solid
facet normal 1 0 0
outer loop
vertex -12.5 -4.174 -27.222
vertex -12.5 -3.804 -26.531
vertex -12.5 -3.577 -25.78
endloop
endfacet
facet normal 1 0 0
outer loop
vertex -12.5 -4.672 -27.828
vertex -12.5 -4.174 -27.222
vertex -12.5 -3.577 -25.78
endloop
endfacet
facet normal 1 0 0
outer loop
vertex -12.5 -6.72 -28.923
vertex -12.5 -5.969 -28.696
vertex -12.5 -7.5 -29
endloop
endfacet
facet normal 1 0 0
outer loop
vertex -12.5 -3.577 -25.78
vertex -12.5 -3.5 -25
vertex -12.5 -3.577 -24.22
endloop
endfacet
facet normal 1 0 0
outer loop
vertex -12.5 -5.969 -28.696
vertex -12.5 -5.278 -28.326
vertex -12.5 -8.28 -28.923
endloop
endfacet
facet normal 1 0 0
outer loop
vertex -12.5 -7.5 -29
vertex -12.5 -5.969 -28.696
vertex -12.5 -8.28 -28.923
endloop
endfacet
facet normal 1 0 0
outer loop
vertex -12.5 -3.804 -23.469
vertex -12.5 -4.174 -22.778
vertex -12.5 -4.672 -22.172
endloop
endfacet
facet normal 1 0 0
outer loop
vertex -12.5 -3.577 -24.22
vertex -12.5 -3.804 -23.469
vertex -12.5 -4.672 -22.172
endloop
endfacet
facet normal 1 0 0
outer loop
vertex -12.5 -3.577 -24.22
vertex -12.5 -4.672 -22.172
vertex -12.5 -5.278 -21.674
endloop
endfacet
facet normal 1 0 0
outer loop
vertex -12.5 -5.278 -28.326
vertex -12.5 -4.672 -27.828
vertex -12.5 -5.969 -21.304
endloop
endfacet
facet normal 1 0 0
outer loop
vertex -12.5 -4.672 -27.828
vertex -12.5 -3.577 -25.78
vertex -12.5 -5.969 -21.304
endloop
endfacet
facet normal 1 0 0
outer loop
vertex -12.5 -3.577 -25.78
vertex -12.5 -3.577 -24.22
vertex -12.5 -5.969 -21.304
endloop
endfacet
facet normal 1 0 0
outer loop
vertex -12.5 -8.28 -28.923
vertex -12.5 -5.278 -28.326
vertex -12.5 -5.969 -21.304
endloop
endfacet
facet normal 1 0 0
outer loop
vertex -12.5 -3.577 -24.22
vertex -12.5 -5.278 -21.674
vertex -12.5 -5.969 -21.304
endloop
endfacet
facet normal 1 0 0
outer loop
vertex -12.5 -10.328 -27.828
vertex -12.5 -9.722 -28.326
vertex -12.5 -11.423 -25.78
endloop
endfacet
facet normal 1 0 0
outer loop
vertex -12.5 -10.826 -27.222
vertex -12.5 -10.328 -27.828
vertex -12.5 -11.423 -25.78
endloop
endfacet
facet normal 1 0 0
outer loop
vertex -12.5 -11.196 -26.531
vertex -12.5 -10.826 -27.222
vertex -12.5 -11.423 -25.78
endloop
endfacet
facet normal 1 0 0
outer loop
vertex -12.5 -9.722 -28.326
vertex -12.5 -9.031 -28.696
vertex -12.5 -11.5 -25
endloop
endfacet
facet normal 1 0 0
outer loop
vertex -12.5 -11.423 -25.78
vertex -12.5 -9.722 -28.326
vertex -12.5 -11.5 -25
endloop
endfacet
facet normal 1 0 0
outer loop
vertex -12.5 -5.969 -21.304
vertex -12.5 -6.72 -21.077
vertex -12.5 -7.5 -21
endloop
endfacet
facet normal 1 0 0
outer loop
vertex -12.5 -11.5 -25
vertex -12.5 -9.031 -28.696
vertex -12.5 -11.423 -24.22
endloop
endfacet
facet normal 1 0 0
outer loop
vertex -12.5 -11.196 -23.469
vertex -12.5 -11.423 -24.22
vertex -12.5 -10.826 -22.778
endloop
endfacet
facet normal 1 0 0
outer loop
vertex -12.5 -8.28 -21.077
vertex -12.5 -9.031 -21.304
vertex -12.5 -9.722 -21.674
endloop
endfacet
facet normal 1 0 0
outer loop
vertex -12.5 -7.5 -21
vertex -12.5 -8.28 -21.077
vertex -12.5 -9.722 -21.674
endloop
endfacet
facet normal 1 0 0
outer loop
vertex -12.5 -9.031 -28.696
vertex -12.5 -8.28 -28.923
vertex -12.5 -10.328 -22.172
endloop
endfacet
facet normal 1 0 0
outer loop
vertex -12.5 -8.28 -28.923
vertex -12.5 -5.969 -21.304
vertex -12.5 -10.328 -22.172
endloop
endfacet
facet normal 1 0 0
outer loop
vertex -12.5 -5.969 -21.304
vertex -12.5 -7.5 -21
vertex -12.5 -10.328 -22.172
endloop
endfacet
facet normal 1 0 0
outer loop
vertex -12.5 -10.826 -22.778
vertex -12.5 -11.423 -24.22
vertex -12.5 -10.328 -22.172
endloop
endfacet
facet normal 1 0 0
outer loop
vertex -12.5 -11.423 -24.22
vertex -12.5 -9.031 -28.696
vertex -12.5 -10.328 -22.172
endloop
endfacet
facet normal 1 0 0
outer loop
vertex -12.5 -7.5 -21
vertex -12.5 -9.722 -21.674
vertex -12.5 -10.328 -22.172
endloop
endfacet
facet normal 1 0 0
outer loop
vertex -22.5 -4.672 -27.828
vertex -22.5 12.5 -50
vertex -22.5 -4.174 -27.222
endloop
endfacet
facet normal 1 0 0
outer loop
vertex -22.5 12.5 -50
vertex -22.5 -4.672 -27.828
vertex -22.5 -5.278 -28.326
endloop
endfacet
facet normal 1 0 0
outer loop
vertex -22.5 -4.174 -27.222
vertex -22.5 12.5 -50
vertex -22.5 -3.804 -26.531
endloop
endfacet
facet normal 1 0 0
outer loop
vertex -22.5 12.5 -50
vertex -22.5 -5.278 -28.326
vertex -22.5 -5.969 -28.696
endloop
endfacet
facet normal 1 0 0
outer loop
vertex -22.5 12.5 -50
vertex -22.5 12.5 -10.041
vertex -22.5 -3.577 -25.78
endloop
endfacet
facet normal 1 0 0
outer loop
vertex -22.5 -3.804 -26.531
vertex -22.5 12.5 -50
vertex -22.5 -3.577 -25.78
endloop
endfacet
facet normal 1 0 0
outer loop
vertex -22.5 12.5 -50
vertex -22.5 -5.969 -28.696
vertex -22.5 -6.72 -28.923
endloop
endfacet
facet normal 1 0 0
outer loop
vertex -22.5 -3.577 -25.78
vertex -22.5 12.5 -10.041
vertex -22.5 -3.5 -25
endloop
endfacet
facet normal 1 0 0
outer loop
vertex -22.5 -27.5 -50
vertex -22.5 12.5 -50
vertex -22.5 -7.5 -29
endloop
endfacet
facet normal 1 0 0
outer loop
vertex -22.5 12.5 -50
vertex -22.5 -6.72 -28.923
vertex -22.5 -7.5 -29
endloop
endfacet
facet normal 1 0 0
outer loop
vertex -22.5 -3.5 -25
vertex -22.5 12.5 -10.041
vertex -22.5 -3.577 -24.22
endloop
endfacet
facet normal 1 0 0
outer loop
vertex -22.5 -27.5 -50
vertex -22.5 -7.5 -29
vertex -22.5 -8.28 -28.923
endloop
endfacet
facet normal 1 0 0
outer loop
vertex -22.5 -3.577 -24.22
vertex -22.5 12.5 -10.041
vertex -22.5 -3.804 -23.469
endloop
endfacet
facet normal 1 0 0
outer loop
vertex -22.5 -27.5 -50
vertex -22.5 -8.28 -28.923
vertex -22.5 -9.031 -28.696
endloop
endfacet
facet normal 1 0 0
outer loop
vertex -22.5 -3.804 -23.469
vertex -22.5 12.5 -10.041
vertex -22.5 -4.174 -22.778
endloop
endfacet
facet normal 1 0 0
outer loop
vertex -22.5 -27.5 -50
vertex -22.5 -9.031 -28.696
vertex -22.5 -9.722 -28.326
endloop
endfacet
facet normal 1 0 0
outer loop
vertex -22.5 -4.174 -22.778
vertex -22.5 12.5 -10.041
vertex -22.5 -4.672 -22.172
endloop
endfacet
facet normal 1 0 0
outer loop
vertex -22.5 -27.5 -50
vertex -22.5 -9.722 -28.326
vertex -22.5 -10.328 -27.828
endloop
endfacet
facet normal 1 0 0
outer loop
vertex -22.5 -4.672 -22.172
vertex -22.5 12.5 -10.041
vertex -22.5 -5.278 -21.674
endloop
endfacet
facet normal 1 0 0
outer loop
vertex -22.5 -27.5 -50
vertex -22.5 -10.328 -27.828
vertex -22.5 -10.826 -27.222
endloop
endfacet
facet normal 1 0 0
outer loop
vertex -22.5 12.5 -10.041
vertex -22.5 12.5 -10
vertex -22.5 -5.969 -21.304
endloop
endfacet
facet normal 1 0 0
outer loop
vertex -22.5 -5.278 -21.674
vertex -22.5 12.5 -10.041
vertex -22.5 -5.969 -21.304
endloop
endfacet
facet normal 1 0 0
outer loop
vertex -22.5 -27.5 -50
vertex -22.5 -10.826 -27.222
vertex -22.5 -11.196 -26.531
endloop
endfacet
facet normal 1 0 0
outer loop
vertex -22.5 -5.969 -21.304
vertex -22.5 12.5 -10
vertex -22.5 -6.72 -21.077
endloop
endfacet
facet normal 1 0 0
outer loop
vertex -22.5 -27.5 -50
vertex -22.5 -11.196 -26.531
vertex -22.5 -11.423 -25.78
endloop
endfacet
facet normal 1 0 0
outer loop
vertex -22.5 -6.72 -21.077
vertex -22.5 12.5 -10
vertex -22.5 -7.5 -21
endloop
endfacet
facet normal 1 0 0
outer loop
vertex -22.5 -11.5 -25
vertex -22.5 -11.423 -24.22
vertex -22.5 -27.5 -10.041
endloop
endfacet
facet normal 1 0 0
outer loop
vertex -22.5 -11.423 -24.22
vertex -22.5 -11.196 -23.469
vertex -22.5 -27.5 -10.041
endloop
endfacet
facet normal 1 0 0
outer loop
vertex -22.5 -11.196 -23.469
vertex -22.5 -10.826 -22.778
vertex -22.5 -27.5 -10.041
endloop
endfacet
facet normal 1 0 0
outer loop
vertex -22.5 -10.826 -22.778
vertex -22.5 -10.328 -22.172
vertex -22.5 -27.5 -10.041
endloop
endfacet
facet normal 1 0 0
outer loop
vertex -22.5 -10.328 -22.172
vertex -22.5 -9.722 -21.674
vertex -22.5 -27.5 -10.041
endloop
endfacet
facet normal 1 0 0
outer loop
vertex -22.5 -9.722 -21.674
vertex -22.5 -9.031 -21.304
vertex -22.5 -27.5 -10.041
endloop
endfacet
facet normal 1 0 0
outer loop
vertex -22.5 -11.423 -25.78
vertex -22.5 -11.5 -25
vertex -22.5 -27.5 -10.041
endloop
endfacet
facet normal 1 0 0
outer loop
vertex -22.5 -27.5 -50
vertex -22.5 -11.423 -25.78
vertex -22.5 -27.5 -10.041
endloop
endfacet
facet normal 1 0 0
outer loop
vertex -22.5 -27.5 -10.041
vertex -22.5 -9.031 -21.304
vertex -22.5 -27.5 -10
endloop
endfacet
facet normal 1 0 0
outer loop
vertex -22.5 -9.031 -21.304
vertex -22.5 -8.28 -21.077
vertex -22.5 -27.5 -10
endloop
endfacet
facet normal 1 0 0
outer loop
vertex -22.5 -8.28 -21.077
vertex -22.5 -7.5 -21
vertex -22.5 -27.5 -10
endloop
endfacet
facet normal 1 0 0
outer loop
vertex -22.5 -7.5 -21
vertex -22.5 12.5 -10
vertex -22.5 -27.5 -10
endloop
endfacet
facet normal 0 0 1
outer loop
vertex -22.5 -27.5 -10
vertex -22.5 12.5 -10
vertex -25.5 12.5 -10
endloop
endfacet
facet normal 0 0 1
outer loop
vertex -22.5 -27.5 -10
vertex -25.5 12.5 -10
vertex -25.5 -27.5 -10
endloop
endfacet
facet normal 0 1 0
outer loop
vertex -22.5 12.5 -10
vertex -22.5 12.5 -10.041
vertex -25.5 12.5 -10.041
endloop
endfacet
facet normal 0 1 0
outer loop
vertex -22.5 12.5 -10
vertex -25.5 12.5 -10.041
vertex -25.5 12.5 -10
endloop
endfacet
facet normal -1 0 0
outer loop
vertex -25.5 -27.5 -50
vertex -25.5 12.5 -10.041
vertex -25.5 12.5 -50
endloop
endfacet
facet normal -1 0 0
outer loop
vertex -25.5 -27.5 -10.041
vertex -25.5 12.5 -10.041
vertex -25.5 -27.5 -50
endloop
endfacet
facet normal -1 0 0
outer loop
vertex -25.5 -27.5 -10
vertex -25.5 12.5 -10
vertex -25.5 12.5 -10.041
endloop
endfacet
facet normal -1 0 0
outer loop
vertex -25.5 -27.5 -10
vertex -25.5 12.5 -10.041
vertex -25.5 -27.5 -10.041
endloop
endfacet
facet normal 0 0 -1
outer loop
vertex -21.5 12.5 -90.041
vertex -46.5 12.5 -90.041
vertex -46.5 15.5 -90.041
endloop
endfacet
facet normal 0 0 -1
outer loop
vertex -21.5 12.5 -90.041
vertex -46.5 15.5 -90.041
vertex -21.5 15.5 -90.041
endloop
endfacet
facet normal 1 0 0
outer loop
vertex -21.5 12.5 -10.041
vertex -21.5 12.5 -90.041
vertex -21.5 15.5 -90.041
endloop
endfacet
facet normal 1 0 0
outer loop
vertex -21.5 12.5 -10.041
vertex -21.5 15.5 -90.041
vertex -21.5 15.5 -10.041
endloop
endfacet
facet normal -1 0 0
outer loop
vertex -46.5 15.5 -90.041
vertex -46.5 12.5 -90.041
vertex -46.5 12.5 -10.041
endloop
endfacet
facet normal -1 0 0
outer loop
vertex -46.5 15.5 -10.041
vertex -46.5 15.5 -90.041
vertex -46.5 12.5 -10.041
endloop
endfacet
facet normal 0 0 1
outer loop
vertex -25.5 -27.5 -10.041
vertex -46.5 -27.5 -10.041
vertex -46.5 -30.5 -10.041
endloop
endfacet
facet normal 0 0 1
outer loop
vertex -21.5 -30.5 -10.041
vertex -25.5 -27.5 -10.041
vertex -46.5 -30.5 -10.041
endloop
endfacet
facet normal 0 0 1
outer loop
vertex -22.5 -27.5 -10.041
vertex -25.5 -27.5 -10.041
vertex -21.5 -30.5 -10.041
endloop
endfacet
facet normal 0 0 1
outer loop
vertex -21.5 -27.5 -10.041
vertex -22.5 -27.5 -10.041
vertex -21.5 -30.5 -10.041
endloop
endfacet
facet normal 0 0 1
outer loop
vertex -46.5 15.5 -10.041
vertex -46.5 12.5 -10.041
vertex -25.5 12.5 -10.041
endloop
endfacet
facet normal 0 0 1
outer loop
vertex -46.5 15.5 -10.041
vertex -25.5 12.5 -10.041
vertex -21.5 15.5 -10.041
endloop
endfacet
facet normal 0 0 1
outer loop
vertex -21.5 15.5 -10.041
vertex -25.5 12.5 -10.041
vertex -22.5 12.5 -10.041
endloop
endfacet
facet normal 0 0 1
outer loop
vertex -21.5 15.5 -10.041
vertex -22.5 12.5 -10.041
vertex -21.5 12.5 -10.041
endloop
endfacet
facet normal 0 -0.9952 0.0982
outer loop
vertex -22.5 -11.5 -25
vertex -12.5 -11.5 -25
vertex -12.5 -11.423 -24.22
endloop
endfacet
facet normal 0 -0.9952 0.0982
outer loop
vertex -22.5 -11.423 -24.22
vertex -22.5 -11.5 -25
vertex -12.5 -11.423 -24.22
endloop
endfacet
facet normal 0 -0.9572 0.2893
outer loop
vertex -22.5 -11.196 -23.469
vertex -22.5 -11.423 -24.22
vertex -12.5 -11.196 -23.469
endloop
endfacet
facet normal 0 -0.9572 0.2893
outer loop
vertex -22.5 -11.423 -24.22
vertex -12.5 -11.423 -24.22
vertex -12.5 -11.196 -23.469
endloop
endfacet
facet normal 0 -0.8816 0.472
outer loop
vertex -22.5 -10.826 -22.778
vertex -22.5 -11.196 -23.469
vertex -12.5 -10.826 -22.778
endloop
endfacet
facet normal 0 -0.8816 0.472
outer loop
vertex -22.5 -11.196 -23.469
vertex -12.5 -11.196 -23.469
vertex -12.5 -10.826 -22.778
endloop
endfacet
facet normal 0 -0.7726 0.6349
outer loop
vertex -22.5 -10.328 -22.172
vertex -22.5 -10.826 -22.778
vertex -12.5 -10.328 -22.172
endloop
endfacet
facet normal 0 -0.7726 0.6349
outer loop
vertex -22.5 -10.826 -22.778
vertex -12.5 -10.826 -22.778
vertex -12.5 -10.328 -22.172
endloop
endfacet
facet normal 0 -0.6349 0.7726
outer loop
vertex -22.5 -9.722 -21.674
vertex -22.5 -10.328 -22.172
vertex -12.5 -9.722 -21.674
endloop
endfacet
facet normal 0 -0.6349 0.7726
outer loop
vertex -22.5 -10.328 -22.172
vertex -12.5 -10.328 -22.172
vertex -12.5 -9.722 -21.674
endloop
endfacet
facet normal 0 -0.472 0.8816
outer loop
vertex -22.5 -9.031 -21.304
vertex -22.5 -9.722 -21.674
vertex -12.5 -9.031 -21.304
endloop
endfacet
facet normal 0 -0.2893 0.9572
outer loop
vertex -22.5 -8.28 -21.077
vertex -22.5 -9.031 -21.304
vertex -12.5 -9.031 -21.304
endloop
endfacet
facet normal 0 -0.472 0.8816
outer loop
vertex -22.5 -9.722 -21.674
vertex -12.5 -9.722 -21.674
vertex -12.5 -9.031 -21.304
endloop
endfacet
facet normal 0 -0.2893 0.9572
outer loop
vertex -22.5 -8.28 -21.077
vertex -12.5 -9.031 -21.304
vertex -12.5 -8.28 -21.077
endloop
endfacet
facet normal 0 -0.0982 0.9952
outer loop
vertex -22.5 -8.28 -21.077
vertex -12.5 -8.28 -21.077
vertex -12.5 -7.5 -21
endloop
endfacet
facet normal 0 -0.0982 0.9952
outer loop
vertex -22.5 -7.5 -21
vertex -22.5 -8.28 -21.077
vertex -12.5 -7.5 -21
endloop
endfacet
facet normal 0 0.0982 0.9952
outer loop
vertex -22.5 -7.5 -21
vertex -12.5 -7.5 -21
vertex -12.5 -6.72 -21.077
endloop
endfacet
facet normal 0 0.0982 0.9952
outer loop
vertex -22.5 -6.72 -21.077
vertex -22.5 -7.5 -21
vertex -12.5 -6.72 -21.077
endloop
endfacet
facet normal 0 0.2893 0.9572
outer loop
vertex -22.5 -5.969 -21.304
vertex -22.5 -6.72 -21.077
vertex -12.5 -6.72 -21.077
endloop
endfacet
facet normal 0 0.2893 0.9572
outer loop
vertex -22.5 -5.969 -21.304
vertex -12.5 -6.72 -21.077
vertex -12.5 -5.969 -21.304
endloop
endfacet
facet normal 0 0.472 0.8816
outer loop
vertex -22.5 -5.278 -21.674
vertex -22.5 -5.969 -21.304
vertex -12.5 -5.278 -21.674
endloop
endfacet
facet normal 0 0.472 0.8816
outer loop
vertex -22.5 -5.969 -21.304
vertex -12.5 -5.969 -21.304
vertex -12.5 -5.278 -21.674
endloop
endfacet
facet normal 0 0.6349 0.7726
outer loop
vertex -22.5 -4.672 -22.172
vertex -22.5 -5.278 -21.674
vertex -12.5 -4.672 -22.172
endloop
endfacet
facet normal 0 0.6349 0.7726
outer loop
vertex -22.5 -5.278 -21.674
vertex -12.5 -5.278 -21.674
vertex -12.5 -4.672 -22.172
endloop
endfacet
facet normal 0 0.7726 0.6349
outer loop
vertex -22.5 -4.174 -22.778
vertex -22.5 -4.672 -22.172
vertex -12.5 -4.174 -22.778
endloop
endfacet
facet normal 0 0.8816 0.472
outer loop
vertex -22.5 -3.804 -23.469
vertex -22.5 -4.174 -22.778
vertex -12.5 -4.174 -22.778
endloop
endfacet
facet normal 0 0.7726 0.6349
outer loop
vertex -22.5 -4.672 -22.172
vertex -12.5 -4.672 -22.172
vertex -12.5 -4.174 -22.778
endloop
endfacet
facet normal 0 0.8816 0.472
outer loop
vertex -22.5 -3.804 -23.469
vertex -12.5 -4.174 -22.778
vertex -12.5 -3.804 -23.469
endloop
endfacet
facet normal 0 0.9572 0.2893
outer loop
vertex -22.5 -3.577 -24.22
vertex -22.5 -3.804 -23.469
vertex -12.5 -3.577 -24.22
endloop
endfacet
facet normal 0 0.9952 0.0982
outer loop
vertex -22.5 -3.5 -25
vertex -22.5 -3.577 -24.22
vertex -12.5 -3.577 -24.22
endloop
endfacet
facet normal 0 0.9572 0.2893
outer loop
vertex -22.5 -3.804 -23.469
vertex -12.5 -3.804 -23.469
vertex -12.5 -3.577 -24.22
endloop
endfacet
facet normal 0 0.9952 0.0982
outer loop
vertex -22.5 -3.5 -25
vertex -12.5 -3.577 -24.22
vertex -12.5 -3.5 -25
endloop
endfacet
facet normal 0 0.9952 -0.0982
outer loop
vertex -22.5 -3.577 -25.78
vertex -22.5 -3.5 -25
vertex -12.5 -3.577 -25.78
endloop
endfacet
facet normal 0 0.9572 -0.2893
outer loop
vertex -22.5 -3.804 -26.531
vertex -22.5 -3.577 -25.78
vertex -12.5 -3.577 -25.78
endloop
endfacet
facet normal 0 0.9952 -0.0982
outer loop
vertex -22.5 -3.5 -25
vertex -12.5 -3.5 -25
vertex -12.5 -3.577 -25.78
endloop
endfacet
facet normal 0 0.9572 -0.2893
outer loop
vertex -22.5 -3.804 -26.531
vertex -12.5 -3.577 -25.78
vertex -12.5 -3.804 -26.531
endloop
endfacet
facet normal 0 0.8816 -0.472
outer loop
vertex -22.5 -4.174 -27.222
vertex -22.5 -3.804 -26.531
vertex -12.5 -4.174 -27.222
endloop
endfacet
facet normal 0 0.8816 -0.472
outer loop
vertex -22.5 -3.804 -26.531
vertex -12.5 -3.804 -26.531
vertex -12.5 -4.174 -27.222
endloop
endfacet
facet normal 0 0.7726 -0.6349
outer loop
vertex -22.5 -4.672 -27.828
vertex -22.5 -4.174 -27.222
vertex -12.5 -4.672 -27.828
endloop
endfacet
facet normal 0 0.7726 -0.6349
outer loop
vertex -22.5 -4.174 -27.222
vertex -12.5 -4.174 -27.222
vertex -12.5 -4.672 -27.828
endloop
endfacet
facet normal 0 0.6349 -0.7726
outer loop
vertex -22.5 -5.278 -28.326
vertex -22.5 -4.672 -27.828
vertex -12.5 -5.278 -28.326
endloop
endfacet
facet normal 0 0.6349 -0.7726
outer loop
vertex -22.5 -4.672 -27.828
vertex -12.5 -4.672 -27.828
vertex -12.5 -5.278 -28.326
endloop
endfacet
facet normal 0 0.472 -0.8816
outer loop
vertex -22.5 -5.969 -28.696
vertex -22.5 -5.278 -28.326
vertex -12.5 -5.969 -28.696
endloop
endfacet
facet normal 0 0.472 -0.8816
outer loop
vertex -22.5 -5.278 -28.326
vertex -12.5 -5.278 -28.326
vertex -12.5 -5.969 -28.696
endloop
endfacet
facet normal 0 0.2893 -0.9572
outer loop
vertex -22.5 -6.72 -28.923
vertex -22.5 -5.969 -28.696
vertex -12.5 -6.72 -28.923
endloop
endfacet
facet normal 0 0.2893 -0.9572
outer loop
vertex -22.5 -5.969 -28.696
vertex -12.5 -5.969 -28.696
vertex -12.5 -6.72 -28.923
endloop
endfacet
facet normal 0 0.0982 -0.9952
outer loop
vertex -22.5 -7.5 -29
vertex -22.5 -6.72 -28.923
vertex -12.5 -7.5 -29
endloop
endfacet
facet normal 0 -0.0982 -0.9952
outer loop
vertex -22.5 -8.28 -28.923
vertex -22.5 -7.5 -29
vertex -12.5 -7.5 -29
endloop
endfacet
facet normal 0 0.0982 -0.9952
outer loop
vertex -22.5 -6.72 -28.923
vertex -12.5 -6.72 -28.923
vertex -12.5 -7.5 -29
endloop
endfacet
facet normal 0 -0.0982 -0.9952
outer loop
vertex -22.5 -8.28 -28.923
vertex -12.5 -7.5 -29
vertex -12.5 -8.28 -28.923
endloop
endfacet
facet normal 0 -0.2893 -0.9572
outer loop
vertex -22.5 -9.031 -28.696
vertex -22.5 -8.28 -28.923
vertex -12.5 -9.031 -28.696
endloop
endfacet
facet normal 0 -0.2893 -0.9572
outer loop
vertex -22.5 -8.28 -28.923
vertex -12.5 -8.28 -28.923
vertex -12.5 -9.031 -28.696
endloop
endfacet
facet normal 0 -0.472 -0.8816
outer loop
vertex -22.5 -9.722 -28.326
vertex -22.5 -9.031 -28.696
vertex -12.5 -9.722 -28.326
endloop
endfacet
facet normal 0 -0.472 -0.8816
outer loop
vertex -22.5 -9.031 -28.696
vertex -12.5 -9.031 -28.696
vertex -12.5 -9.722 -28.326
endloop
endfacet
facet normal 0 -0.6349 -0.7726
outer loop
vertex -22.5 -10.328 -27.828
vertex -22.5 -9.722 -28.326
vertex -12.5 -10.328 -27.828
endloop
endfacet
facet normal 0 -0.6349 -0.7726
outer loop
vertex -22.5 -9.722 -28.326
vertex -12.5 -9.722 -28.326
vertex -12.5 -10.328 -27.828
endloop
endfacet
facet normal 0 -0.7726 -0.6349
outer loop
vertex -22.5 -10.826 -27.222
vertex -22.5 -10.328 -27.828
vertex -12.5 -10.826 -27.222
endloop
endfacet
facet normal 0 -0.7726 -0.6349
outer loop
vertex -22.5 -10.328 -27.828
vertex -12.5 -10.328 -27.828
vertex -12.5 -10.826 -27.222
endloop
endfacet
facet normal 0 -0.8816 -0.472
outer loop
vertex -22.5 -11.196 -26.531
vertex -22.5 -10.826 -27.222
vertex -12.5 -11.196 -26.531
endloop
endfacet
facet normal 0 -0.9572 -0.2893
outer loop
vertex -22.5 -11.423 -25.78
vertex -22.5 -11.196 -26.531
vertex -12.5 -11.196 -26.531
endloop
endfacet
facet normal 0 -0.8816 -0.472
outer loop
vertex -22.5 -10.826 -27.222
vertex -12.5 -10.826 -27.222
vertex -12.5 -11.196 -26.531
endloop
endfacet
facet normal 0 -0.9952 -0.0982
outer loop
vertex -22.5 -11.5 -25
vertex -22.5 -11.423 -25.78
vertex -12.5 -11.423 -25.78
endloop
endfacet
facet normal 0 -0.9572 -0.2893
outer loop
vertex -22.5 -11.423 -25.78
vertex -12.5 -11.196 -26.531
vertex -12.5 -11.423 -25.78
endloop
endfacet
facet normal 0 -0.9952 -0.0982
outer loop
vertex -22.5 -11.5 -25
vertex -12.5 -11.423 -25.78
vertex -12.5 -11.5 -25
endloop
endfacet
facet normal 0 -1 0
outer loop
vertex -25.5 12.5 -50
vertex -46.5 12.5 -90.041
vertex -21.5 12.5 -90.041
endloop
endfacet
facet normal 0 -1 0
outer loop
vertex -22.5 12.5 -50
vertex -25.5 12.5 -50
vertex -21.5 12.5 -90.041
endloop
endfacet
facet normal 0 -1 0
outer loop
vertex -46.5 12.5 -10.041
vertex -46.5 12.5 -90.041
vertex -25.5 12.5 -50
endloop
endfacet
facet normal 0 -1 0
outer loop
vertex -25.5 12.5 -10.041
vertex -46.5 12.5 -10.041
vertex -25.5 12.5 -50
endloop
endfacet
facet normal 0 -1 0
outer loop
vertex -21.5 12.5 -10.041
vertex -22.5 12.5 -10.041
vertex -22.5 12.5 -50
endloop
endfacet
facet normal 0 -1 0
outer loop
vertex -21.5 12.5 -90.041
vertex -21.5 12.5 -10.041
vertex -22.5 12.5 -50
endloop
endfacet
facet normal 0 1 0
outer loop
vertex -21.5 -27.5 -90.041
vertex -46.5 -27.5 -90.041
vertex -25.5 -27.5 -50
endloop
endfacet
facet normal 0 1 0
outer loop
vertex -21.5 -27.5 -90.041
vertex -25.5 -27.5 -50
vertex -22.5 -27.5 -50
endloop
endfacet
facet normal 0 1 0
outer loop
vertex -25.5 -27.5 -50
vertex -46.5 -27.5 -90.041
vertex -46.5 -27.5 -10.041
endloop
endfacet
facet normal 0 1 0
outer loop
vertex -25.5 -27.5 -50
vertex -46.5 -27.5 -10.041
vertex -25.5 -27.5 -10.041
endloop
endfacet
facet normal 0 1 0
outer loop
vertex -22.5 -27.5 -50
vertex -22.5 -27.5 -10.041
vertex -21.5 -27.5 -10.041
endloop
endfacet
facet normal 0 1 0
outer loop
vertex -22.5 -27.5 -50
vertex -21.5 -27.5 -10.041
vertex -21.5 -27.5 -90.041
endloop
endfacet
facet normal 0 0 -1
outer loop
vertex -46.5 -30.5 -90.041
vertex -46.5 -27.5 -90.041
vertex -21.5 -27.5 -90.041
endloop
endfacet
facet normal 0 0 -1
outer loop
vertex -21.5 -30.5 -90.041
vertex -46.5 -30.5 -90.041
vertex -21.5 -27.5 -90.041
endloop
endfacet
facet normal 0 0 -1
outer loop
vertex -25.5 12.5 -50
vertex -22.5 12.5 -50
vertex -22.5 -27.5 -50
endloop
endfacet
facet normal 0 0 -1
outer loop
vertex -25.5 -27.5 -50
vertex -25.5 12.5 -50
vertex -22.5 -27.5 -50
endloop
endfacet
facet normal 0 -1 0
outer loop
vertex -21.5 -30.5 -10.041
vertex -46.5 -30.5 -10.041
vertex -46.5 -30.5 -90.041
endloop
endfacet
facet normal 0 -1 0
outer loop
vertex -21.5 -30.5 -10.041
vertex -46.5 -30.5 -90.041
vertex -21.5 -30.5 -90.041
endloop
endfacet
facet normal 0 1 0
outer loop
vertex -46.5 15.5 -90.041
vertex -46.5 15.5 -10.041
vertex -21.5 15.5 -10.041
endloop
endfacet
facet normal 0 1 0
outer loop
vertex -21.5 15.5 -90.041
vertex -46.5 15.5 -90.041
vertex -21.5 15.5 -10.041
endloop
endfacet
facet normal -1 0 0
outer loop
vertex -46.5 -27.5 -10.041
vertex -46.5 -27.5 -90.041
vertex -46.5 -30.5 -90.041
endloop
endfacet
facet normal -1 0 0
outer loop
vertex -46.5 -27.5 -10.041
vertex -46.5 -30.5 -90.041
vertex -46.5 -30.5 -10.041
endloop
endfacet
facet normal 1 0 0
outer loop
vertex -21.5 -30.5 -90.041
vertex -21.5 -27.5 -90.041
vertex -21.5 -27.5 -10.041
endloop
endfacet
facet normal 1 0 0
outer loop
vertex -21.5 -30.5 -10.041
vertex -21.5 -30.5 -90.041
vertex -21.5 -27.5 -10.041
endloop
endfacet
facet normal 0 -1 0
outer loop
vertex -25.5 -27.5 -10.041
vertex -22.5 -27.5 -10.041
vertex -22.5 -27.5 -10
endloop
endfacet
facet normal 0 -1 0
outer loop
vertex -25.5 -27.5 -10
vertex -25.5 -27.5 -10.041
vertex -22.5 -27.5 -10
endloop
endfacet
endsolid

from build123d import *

# Parameters (mm, degrees)
SKETCH005_W  = 25
SKETCH005_H  = 80
PAD004_DEPTH = 3
SKETCH003_R  = 4
PAD002_DEPTH = 10
SKETCH004_W  = 40
SKETCH004_H  = 40
PAD003_DEPTH = 3
SKETCH006_W  = 25
SKETCH006_H  = 80
PAD005_DEPTH = 3


with BuildPart() as pad004:
    # Sketch005 → Pad004 (new body)
    with BuildSketch(Plane.XZ.offset(-12.5)):
        with Locations((-34, -50.041499)):
            Rectangle(SKETCH005_W, SKETCH005_H)
    extrude(amount=-PAD004_DEPTH)


with BuildPart() as pad002:
    # Sketch003 → Pad002 (new body)
    with BuildSketch(Plane(origin=(-12.5, 0, 0), x_dir=(0, -1, 0), z_dir=(-1, 0, 0))):
        with Locations((7.5, -25)):
            Circle(SKETCH003_R)
    extrude(amount=PAD002_DEPTH)


with BuildPart() as pad003:
    # Sketch004 → Pad003 (new body)
    with BuildSketch(Plane(origin=(-22.5, 0, 0), x_dir=(0, -1, 0), z_dir=(-1, 0, 0))):
        with Locations((7.5, -30)):
            Rectangle(SKETCH004_W, SKETCH004_H)
    extrude(amount=PAD003_DEPTH)


with BuildPart() as fusion005:
    # Sketch006 → Pad005 (new body)
    with BuildSketch(Plane.XZ.offset(27.5)):
        with Locations((-34, -50.041499)):
            Rectangle(SKETCH006_W, SKETCH006_H)
    extrude(amount=PAD005_DEPTH)

    # Fusion005: union Pad004, Pad002, Pad003
    add(pad004.part)
    add(pad002.part)
    add(pad003.part)


solid = fusion005.part
